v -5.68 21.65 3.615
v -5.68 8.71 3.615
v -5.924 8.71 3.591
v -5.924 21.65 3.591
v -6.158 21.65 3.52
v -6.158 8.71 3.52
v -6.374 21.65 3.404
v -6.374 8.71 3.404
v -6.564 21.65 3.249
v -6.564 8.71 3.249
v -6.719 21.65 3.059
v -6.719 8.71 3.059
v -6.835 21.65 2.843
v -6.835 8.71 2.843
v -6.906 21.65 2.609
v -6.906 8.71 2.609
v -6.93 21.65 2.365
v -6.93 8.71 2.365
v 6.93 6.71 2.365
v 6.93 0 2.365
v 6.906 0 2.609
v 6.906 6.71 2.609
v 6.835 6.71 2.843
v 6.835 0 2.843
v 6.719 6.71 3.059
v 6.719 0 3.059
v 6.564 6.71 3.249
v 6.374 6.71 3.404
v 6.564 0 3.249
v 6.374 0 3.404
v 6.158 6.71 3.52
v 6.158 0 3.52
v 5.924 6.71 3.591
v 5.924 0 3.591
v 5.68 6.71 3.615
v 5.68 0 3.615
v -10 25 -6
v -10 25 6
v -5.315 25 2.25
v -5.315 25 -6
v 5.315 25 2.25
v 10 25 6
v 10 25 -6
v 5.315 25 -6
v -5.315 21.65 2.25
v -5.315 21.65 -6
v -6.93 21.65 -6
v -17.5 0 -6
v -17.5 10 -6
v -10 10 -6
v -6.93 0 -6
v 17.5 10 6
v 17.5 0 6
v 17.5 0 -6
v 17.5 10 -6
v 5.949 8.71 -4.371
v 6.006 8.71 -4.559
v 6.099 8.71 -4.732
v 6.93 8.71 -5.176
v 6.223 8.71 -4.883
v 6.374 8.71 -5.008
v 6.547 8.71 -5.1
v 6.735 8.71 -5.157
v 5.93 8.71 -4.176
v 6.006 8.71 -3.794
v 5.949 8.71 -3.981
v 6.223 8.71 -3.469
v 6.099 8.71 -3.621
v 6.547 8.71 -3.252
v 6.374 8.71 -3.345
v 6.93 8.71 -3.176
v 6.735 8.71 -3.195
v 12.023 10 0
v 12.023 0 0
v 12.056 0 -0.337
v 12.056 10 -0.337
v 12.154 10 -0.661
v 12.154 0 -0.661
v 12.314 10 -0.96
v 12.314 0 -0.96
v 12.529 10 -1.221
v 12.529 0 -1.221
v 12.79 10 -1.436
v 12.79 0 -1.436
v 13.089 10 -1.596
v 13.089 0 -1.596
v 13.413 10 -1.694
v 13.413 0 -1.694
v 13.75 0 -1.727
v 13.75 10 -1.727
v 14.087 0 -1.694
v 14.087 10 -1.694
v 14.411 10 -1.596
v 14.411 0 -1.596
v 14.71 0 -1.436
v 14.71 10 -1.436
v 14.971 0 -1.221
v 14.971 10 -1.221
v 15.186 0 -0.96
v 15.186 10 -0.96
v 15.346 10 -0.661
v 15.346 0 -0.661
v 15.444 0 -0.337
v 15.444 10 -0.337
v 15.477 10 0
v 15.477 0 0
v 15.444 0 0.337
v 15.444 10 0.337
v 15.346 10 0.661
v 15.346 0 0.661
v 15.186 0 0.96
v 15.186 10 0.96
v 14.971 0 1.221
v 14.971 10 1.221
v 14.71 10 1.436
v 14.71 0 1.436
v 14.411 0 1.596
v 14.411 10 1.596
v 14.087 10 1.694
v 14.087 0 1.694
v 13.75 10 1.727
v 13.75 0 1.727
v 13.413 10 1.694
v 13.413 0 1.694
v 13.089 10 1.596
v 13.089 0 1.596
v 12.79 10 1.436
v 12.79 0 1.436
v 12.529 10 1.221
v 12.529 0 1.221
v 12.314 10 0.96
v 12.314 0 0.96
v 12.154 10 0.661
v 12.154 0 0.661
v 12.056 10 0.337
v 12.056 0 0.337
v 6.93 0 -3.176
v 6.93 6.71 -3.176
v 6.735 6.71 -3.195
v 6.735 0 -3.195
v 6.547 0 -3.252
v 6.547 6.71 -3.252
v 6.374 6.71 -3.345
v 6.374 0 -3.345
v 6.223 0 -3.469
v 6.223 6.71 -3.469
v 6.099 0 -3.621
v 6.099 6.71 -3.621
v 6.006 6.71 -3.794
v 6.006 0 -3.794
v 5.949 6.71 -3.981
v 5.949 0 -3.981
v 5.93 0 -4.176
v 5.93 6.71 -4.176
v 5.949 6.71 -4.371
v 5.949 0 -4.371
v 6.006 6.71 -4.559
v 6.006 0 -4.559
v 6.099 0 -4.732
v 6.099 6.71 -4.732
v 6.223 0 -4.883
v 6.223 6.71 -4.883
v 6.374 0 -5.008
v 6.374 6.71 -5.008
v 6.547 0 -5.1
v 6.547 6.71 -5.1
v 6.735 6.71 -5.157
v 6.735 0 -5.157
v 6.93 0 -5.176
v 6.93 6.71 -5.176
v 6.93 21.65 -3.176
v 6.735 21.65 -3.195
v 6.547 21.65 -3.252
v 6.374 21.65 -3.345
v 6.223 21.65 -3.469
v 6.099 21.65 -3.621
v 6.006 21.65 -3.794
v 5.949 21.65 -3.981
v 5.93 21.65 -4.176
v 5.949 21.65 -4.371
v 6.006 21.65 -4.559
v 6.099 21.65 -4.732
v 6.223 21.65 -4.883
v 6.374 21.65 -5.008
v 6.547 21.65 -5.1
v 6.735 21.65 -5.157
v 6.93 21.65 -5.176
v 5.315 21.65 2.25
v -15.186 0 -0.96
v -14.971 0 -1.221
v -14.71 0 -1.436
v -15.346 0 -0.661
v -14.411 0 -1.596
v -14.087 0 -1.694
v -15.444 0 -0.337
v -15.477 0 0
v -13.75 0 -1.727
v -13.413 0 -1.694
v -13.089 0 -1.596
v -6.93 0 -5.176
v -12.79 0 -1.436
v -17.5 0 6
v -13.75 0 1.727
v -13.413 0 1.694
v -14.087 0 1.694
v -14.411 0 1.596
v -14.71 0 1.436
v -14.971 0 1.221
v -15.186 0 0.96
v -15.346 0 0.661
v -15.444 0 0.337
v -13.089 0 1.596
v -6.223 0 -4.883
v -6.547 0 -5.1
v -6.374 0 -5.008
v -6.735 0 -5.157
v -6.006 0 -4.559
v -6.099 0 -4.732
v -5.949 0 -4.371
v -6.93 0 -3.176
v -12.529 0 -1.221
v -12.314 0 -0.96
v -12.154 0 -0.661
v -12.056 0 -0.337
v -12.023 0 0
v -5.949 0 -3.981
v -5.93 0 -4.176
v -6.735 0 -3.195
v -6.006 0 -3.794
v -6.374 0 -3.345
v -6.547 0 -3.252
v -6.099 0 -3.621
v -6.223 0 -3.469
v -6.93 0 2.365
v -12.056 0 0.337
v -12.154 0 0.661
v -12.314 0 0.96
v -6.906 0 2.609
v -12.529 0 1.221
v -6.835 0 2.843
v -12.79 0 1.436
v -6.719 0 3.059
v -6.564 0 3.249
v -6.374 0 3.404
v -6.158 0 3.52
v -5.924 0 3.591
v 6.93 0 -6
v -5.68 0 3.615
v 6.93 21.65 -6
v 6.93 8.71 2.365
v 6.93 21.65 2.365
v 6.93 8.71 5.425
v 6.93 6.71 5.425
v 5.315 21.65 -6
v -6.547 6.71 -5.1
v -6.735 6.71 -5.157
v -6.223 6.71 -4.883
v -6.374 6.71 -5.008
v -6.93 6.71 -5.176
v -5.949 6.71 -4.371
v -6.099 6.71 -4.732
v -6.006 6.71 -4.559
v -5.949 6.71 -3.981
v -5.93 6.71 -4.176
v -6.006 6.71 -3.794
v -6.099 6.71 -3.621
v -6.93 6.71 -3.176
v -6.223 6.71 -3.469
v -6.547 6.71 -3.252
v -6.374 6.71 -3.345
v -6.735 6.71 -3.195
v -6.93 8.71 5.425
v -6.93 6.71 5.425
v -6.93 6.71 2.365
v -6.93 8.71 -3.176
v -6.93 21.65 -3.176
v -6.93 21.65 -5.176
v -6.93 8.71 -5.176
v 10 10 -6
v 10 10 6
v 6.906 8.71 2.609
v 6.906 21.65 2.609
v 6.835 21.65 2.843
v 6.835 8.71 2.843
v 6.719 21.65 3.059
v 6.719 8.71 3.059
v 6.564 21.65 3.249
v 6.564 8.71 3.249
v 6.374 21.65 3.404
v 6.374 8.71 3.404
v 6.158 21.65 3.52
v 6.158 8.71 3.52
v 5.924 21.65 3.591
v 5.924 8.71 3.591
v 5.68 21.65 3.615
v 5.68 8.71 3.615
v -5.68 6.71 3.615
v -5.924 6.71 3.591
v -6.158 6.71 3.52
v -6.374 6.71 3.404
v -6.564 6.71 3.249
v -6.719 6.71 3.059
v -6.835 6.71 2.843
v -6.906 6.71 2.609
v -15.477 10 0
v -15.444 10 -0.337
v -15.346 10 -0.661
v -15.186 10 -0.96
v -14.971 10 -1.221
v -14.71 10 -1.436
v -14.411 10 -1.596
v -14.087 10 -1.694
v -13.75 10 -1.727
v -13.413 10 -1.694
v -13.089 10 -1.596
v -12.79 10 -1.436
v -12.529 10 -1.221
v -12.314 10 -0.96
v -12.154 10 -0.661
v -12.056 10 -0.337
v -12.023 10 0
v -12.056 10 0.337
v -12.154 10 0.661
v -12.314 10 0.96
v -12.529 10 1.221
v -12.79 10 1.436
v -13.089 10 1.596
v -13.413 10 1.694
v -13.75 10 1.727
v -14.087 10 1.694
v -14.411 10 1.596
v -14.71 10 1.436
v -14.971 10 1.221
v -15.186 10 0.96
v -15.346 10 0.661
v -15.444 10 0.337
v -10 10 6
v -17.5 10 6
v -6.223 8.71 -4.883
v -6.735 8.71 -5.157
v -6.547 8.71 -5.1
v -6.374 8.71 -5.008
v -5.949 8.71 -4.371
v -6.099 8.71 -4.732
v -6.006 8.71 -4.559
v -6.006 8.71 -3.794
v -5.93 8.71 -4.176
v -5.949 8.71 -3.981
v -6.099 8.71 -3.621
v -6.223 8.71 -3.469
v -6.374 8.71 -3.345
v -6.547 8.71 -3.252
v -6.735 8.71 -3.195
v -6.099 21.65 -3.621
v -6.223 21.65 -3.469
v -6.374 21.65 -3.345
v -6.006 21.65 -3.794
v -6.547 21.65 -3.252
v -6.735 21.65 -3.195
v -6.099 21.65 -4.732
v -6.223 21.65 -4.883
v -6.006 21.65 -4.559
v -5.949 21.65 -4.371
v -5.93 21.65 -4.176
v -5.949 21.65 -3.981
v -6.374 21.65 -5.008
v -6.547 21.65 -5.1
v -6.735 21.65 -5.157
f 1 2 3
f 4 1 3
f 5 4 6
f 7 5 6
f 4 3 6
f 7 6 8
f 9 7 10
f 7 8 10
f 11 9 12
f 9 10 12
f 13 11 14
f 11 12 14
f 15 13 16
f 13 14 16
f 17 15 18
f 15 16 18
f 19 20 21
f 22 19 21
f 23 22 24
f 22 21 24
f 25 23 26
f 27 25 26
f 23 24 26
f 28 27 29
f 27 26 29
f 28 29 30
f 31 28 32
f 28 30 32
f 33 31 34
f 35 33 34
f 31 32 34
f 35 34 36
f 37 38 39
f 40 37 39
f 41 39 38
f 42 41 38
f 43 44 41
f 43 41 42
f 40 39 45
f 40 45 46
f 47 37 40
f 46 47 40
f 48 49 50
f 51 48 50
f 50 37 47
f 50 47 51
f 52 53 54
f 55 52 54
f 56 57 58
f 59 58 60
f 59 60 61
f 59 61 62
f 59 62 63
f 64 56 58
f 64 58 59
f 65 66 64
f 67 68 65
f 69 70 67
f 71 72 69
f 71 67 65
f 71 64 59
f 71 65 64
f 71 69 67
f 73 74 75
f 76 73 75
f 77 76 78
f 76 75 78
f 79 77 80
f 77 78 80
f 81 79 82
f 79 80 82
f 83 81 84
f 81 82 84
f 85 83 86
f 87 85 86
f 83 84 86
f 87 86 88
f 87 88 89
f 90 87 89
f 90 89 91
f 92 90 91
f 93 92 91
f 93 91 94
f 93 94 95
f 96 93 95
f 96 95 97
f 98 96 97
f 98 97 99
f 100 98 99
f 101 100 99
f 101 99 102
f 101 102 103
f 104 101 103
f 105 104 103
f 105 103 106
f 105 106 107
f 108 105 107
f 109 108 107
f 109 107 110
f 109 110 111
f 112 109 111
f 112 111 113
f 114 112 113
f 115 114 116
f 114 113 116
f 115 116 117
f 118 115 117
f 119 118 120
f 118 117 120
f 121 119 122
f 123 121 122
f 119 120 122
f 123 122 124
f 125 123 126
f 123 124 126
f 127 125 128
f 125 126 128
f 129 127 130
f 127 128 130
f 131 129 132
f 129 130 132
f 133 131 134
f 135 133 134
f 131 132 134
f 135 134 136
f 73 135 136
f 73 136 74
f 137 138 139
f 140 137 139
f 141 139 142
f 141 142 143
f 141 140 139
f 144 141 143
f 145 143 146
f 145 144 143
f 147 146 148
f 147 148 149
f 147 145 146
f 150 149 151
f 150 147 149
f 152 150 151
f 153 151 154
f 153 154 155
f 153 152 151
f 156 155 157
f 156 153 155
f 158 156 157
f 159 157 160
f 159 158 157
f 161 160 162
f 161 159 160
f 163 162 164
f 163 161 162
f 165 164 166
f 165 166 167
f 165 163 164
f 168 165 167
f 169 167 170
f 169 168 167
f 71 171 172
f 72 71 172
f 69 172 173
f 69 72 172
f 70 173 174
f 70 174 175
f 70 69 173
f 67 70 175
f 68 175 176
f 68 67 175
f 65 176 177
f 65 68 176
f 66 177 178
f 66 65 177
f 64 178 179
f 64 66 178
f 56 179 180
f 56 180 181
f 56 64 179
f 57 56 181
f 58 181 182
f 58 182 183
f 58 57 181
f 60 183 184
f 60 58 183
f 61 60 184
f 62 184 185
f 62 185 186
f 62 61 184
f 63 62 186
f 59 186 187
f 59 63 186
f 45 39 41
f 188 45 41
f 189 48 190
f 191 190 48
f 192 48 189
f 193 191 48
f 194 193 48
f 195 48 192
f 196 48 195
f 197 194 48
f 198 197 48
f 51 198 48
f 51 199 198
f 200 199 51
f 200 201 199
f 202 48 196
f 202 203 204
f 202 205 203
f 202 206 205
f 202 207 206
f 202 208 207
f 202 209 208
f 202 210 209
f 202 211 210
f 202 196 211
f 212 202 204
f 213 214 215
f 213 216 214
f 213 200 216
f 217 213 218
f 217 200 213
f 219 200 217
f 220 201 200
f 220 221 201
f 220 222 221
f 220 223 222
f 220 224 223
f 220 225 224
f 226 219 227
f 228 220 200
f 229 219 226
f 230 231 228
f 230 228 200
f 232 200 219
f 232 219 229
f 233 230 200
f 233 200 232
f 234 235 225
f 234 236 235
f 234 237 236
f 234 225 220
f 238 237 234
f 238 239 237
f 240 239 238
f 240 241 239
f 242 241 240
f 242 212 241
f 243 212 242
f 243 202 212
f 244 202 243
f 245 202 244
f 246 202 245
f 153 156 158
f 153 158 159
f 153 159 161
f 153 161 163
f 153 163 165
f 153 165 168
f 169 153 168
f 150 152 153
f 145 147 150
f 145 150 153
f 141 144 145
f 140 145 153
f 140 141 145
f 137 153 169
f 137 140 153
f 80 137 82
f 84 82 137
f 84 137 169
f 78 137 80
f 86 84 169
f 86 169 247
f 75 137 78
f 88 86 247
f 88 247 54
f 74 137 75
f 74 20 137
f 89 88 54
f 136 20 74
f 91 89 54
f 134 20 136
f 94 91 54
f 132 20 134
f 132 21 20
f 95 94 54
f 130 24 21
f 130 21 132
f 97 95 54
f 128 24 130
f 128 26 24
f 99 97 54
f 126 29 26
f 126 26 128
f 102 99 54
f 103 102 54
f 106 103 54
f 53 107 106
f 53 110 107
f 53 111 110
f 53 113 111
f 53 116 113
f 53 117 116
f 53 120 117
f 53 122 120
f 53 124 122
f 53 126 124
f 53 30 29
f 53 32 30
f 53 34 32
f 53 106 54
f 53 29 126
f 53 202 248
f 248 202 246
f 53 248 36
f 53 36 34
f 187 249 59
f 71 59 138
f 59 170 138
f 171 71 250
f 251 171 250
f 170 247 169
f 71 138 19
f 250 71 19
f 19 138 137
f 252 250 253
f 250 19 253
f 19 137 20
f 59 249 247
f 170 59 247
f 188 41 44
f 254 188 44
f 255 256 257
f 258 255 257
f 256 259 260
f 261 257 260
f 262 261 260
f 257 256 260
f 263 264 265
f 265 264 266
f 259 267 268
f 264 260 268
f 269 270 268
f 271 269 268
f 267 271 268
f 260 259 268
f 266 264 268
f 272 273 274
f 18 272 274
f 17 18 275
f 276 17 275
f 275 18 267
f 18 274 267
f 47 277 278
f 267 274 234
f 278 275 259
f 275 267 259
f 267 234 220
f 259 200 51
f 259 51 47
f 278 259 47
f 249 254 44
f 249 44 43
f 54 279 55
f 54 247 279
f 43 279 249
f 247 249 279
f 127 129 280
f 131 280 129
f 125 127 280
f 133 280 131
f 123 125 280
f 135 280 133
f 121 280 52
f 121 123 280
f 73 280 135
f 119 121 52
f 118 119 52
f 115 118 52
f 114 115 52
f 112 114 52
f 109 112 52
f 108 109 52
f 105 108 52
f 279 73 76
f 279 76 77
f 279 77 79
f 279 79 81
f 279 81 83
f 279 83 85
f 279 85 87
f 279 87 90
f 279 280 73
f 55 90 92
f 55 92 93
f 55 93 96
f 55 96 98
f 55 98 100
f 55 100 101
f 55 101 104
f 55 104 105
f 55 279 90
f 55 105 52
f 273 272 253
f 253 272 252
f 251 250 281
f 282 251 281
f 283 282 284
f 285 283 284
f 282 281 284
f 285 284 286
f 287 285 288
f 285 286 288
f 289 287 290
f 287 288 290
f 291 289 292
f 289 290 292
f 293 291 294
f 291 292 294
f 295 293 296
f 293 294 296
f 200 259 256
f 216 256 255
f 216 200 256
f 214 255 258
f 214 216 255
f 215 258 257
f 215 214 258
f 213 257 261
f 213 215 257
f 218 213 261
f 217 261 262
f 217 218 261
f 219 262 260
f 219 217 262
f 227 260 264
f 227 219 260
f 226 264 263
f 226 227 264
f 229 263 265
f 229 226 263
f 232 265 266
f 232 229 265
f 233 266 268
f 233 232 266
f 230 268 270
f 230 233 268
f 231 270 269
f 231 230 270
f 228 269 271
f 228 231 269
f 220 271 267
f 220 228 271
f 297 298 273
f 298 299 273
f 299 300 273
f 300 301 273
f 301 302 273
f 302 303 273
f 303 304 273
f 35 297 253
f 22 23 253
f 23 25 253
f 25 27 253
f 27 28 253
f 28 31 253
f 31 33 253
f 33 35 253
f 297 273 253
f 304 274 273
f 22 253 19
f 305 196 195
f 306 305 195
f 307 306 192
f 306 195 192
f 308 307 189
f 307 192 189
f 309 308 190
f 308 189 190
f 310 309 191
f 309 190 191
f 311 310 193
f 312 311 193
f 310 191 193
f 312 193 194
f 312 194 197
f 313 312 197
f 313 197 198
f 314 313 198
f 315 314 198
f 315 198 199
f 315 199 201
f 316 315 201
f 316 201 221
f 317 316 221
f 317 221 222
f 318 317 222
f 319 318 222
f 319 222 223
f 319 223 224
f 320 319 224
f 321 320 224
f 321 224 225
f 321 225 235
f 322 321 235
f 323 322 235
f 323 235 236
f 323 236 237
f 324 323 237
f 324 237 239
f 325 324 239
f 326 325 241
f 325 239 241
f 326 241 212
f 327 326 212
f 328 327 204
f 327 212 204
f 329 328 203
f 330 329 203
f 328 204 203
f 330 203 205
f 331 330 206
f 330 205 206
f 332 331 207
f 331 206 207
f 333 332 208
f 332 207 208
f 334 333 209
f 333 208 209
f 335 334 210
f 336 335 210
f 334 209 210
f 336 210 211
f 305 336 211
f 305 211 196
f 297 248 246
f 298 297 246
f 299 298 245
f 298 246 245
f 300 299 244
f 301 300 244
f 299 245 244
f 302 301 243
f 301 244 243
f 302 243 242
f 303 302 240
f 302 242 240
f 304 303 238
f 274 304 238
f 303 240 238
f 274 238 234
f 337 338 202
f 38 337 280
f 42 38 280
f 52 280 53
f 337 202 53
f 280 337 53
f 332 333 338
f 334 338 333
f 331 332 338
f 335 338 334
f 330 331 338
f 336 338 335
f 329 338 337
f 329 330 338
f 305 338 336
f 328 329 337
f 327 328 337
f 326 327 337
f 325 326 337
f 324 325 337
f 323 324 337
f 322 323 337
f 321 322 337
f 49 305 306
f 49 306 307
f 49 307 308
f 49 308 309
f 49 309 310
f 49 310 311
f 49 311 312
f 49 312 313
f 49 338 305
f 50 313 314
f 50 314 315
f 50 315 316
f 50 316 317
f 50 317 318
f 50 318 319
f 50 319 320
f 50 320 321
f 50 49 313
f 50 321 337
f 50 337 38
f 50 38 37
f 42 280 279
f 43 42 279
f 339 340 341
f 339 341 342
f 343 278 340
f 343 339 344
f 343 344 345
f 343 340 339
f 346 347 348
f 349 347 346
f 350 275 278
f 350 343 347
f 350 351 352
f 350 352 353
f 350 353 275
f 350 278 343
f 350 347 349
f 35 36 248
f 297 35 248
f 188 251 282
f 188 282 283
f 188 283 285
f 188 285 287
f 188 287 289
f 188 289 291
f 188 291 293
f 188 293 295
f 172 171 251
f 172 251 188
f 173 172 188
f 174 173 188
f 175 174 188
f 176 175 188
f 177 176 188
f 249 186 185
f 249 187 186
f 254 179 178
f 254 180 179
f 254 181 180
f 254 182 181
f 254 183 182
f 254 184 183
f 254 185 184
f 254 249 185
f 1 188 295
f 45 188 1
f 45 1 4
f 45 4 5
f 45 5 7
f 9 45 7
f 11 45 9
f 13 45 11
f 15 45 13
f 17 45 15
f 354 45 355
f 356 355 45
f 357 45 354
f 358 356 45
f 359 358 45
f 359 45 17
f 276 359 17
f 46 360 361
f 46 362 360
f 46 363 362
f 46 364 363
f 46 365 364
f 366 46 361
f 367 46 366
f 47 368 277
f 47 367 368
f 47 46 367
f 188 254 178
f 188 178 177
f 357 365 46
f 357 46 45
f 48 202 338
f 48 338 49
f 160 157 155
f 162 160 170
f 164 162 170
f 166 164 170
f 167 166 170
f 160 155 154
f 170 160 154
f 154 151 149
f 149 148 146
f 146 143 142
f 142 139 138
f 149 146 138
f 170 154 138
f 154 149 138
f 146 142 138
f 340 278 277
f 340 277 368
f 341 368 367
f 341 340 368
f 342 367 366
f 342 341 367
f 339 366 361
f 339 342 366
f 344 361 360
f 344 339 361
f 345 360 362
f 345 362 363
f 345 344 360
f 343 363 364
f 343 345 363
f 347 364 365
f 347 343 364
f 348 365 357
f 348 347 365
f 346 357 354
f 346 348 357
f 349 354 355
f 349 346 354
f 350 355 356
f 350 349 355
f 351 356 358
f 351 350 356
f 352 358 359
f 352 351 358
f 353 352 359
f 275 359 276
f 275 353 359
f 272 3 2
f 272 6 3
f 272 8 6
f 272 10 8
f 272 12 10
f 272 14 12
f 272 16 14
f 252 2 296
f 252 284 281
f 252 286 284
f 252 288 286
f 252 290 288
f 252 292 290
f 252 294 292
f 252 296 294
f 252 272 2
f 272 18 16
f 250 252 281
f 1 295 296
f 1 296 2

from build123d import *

# Parameters (mm, degrees)
SKETCH1_W                 = 35
SKETCH1_H                 = 12
BOSS_EXTRUDE1_DEPTH       = 10
SKETCH2_W                 = 20
SKETCH2_H                 = 12
BOSS_EXTRUDE2_DEPTH       = 25
CUT_EXTRUDE1_DEPTH        = 21.65
SKETCH6_W                 = 10.63
SKETCH6_H                 = 8.25
CUT_EXTRUDE2_DEPTH        = 3.35
SKETCH8_R                 = 1
BOSS_EXTRUDE3_DEPTH       = 21.65
CUT_EXTRUDE3_DEPTH        = 0.5
CUT_EXTRUDE3_DEPTH_BACK   = 1.5
SKETCH9_W                 = 13.86
SKETCH9_H                 = 10.85
TAP_DRILL_FOR_8_32_TAP1_D = 3.4544


with BuildPart() as part:
    # Sketch1 → Boss-Extrude1 (new body)
    with BuildSketch(Plane(origin=(0, 0, 0), x_dir=(1, 0, 0), z_dir=(0, 1, 0))):
        Rectangle(SKETCH1_W, SKETCH1_H)
    extrude(amount=BOSS_EXTRUDE1_DEPTH)

    # Sketch2 → Boss-Extrude2 (add)
    with BuildSketch(Plane(origin=(0, 0, 0), x_dir=(1, 0, 0), z_dir=(0, 1, 0))):
        Rectangle(SKETCH2_W, SKETCH2_H)
    extrude(amount=BOSS_EXTRUDE2_DEPTH)

    # Sketch5 → Cut-Extrude1 (cut)
    with BuildSketch(Plane(origin=(0, 0, 0), x_dir=(1, 0, 0), z_dir=(0, 1, 0))):
        with BuildLine():
            Line((6.93, 6), (6.93, -2.365))
            ThreePointArc((6.93, -2.365), (6.563883476, -3.248883476), (5.68, -3.615))
            Line((5.68, -3.615), (-5.68, -3.615))
            ThreePointArc((-5.68, -3.615), (-6.563883476, -3.248883476), (-6.93, -2.365))
            Line((-6.93, -2.365), (-6.93, 6))
            Line((-6.93, 6), (6.93, 6))
        make_face()
    extrude(amount=CUT_EXTRUDE1_DEPTH, mode=Mode.SUBTRACT)

    # Sketch6 → Cut-Extrude2 (cut)
    with BuildSketch(Plane(origin=(0, 25, 0), x_dir=(1, 0, 0), z_dir=(0, 1, 0))):
        with Locations((0, 1.875)):
            Rectangle(SKETCH6_W, SKETCH6_H)
    extrude(amount=-CUT_EXTRUDE2_DEPTH, mode=Mode.SUBTRACT)

    # Sketch8 → Boss-Extrude3 (add)
    with BuildSketch(Plane.XZ):
        with Locations((-6.93, -4.1762495)):
            Circle(SKETCH8_R)
        with Locations((6.93, -4.1762495)):
            Circle(SKETCH8_R)
    extrude(amount=-BOSS_EXTRUDE3_DEPTH)

    # Sketch9 → Cut-Extrude3 (cut, two sides: drawn at the far end of the back side and taken through both)
    with BuildSketch(Plane.XZ.offset(-7.21).offset(-CUT_EXTRUDE3_DEPTH_BACK)):
        Rectangle(SKETCH9_W, SKETCH9_H)
    extrude(amount=CUT_EXTRUDE3_DEPTH + CUT_EXTRUDE3_DEPTH_BACK, mode=Mode.SUBTRACT)

    # Tap Drill for #8-32 Tap1 (through all)
    with Locations(Plane(origin=(0, 10, 0), x_dir=(1, 0, 0), z_dir=(0, 1, 0))):
        with Locations((-13.75, 0), (13.75, 0)):
            Hole(TAP_DRILL_FOR_8_32_TAP1_D / 2)


solid = part.part
